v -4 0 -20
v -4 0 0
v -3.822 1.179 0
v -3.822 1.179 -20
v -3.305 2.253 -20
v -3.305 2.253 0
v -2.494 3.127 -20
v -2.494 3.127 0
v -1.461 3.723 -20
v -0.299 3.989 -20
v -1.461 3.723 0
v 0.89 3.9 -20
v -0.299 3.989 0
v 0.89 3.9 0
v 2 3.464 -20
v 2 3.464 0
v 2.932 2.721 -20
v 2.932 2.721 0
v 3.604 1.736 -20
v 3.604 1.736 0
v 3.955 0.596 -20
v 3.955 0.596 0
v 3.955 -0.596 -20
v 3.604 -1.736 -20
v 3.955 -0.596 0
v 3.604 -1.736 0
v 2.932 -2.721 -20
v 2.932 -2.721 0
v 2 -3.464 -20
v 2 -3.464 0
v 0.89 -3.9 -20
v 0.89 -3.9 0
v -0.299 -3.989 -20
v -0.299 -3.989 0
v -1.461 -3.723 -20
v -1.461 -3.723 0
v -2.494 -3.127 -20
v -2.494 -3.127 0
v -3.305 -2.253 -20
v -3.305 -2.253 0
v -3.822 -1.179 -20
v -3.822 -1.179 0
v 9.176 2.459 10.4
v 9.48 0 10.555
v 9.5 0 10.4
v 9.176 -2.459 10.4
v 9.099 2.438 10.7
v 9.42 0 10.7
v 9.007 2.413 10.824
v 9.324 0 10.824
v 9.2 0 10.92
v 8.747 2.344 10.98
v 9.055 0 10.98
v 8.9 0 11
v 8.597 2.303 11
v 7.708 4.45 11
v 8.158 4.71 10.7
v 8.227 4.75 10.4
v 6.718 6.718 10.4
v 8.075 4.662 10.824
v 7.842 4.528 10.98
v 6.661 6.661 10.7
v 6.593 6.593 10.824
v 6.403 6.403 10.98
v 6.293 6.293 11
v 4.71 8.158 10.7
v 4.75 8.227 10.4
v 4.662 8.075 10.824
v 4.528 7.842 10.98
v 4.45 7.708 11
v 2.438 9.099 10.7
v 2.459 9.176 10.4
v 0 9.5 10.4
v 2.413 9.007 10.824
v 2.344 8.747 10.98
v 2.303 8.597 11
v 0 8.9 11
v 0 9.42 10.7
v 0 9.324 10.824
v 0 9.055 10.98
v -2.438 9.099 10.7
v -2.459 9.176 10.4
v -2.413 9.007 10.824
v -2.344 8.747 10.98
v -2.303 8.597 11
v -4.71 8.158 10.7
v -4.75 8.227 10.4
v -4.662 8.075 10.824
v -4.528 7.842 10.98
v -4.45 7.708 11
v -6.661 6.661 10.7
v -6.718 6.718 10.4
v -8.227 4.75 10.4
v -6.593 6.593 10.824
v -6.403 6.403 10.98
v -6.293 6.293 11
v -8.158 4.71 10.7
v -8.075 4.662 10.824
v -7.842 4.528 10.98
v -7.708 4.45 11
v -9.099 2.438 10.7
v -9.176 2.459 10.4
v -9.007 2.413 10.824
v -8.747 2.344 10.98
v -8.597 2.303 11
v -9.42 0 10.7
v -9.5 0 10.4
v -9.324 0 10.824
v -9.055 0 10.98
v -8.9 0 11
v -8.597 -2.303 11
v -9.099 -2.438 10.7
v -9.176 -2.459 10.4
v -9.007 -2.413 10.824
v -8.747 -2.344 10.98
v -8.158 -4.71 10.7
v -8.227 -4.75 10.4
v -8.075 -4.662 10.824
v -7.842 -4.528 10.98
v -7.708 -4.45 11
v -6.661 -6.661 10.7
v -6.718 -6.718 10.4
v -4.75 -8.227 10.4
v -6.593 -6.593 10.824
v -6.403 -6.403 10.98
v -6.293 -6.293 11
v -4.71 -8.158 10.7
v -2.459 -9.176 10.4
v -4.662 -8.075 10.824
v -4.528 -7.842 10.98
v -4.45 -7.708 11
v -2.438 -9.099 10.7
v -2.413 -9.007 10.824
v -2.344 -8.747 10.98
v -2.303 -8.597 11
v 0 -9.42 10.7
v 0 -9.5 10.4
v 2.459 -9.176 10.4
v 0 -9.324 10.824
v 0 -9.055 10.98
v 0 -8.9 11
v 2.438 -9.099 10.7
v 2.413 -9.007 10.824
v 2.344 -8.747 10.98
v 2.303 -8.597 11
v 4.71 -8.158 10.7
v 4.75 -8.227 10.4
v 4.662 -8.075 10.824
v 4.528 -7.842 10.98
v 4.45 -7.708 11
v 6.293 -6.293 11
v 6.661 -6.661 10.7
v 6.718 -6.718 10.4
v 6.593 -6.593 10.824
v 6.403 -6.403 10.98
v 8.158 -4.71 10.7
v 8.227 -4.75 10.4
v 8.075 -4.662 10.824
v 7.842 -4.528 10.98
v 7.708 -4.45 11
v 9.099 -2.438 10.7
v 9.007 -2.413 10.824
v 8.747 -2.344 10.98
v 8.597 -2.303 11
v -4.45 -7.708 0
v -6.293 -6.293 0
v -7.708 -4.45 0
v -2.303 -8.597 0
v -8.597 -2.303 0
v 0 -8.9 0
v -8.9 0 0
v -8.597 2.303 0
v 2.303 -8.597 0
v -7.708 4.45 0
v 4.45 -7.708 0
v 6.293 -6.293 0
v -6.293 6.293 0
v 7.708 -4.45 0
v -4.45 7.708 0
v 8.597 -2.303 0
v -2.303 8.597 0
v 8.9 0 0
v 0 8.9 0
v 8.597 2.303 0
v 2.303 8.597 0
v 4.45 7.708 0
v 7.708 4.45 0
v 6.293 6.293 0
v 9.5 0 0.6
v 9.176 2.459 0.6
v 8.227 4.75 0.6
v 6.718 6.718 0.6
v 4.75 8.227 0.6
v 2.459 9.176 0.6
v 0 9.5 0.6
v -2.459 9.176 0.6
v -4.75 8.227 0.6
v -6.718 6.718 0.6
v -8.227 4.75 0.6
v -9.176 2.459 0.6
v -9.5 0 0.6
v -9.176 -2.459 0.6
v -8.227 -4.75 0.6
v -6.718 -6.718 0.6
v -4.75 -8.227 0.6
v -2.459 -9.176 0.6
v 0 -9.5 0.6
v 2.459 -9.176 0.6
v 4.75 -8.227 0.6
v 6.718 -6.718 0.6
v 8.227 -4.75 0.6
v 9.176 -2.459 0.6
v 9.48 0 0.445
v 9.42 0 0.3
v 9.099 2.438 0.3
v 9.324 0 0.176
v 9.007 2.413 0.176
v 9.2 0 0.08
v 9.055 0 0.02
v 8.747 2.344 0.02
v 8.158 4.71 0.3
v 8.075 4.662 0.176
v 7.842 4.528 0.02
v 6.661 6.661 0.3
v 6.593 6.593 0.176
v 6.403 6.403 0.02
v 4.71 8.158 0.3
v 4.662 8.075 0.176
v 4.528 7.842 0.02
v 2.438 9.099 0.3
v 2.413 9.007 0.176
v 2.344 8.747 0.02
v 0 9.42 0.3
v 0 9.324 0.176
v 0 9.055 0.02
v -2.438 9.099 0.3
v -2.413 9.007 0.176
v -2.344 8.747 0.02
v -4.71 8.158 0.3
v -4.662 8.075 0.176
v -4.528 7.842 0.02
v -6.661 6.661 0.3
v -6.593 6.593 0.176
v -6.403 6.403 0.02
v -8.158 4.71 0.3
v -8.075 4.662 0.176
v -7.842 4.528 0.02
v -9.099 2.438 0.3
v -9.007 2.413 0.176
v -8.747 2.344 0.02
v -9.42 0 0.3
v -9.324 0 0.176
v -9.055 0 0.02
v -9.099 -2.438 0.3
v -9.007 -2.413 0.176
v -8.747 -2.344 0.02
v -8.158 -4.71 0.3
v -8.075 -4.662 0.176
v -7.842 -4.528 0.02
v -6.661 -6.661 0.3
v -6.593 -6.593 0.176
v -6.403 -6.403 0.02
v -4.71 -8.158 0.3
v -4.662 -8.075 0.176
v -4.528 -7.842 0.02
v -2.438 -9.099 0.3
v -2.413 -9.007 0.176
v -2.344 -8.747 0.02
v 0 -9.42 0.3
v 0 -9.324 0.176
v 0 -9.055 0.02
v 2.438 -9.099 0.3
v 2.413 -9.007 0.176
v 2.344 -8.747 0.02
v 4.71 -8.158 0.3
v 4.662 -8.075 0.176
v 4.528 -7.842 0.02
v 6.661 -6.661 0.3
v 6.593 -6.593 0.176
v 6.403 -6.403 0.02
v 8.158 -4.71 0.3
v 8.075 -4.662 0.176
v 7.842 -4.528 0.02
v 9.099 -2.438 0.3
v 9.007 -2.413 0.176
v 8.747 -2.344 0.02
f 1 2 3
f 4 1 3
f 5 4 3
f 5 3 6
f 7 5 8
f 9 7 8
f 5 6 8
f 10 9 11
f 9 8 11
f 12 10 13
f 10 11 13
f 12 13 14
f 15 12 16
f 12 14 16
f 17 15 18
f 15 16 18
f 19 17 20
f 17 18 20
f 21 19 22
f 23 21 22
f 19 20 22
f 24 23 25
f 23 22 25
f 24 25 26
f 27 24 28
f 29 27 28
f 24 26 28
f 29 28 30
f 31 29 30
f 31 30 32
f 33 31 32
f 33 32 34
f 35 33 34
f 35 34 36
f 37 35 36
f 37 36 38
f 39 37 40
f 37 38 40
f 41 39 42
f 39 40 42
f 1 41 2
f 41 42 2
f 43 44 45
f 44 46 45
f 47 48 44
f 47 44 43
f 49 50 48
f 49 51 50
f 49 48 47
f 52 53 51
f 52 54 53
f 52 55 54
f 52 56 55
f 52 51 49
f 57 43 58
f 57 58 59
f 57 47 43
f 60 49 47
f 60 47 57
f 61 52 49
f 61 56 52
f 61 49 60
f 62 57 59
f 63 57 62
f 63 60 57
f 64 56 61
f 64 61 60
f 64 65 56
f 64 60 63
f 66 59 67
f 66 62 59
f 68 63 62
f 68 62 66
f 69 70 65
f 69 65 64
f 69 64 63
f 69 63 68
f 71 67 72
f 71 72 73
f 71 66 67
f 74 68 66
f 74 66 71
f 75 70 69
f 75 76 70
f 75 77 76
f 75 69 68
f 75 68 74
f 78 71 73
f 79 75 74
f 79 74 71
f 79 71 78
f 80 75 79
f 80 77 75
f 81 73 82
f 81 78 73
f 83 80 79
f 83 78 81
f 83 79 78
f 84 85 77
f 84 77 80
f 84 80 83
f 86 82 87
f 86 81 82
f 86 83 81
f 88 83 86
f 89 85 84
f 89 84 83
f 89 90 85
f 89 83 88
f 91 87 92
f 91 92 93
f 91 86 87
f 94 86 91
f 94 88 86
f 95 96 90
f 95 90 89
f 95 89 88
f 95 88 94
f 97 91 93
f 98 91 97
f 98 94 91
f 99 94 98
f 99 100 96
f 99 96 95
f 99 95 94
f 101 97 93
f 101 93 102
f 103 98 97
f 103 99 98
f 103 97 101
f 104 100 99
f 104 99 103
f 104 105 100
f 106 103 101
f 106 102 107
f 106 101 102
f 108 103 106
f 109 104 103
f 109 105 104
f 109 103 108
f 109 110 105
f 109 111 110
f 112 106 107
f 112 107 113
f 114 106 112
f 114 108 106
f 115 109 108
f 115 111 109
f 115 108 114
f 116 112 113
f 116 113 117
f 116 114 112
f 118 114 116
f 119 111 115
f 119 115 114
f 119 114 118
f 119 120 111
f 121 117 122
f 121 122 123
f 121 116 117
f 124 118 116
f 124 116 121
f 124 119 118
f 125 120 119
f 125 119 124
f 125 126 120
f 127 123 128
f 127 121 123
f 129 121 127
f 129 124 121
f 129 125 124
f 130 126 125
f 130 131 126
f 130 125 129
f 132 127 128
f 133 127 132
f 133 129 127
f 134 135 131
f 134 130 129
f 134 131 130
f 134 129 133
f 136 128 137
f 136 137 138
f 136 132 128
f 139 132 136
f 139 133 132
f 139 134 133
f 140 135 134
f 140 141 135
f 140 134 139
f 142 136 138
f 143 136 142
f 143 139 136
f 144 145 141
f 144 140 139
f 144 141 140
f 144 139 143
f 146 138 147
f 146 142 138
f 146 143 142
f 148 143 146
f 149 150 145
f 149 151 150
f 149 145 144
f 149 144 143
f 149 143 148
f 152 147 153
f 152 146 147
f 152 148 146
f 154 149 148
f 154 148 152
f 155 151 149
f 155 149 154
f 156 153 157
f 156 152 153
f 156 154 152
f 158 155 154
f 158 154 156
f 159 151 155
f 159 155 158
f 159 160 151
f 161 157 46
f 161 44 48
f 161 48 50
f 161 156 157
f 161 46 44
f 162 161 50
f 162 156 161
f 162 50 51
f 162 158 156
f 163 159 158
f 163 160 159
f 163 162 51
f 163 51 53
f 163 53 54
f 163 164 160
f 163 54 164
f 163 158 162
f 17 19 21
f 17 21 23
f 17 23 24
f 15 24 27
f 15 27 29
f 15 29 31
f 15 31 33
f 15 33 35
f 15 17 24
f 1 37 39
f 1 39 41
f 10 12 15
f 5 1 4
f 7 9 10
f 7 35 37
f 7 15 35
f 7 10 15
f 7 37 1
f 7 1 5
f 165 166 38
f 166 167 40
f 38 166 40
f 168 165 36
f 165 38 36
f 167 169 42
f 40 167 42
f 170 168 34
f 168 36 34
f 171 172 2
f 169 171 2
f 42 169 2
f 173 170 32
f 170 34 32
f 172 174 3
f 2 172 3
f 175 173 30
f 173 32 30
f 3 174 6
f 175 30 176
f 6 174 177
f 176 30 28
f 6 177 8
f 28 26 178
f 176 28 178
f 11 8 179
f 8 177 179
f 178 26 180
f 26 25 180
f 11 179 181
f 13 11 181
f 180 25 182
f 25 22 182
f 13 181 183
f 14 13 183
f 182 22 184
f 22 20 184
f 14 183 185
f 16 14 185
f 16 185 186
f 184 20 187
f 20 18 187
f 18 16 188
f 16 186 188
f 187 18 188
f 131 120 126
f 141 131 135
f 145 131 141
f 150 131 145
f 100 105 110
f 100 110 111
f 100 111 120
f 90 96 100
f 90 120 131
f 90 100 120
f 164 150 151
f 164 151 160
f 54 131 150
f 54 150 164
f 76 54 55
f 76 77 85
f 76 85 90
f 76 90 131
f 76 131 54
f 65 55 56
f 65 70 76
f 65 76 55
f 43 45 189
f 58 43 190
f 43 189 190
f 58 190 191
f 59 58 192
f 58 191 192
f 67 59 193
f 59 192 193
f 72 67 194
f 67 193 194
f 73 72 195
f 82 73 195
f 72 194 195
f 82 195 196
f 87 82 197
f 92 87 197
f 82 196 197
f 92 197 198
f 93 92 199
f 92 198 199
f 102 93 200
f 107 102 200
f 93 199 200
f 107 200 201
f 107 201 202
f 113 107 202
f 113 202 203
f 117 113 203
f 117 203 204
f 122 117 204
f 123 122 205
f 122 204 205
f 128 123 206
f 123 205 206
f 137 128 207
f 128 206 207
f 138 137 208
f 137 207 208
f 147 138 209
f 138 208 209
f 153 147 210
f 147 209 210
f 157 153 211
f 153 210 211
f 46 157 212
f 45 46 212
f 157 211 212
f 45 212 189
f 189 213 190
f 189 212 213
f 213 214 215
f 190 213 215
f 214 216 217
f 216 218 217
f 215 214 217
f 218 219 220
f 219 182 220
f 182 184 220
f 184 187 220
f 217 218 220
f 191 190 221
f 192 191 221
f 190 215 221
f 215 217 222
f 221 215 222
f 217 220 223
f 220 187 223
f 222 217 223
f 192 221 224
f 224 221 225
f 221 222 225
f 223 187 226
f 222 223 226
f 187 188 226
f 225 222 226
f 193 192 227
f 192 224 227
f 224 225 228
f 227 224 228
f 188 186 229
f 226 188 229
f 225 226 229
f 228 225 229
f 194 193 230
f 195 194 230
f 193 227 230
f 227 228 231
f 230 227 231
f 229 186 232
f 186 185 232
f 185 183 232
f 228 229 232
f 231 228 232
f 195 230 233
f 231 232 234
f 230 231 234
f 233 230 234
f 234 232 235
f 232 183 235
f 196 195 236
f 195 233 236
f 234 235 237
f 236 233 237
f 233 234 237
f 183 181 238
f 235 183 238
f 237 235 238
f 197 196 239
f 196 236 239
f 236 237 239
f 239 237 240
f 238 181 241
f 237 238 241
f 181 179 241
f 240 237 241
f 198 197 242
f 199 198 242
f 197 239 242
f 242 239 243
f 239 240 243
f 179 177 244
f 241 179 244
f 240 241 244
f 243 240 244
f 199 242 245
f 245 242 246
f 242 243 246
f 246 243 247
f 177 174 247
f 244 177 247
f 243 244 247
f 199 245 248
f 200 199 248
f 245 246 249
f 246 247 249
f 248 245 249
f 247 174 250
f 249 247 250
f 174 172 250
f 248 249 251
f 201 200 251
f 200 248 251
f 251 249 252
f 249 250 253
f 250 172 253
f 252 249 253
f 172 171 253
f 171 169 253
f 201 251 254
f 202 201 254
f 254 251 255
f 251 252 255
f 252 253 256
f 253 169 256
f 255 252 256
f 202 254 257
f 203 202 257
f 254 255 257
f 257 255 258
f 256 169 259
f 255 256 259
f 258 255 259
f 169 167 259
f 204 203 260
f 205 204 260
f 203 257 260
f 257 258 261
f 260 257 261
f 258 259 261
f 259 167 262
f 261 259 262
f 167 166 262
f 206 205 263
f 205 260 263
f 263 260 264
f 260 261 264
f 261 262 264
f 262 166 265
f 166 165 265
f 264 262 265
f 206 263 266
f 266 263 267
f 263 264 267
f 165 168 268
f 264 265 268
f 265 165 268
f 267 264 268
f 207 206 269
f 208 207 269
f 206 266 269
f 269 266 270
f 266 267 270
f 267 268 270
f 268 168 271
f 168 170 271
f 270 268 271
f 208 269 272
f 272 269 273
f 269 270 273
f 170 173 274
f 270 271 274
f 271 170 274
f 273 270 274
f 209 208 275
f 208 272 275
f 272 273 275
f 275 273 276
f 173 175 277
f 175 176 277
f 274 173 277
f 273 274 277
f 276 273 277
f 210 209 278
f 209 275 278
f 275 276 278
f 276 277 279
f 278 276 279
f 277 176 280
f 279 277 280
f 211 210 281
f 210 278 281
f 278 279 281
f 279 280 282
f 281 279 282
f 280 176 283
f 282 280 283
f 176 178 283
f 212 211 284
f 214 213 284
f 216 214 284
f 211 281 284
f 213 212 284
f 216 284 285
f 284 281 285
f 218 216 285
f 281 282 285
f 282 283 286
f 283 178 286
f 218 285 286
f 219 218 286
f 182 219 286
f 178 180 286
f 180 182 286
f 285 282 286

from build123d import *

# Parameters (mm, degrees)
SKETCH1_R           = 9.5
BOSS_EXTRUDE1_DEPTH = 11
SKETCH2_R           = 4
BOSS_EXTRUDE2_DEPTH = 20
FILLET1_R           = 0.6
FILLET2_R           = 0.6


with BuildPart() as part:
    # Sketch1 → Boss-Extrude1 (new body)
    with BuildSketch(Plane.XY):
        Circle(SKETCH1_R)
    extrude(amount=BOSS_EXTRUDE1_DEPTH)

    # Sketch2 → Boss-Extrude2 (add)
    with BuildSketch(Plane(origin=(0, 0, 0), x_dir=(-1, 0, 0), z_dir=(0, 0, -1))):
        Circle(SKETCH2_R)
    extrude(amount=BOSS_EXTRUDE2_DEPTH)

    # Fillet1
    fillet1_edges = [part.edges().sort_by_distance(p)[0] for p in [
        (-9.5, 0, 11),
    ]]
    fillet(fillet1_edges, radius=FILLET1_R)

    # Fillet2
    fillet2_edges = [part.edges().sort_by_distance(p)[0] for p in [
        (-9.5, 0, 0),
    ]]
    fillet(fillet2_edges, radius=FILLET2_R)


solid = part.part
